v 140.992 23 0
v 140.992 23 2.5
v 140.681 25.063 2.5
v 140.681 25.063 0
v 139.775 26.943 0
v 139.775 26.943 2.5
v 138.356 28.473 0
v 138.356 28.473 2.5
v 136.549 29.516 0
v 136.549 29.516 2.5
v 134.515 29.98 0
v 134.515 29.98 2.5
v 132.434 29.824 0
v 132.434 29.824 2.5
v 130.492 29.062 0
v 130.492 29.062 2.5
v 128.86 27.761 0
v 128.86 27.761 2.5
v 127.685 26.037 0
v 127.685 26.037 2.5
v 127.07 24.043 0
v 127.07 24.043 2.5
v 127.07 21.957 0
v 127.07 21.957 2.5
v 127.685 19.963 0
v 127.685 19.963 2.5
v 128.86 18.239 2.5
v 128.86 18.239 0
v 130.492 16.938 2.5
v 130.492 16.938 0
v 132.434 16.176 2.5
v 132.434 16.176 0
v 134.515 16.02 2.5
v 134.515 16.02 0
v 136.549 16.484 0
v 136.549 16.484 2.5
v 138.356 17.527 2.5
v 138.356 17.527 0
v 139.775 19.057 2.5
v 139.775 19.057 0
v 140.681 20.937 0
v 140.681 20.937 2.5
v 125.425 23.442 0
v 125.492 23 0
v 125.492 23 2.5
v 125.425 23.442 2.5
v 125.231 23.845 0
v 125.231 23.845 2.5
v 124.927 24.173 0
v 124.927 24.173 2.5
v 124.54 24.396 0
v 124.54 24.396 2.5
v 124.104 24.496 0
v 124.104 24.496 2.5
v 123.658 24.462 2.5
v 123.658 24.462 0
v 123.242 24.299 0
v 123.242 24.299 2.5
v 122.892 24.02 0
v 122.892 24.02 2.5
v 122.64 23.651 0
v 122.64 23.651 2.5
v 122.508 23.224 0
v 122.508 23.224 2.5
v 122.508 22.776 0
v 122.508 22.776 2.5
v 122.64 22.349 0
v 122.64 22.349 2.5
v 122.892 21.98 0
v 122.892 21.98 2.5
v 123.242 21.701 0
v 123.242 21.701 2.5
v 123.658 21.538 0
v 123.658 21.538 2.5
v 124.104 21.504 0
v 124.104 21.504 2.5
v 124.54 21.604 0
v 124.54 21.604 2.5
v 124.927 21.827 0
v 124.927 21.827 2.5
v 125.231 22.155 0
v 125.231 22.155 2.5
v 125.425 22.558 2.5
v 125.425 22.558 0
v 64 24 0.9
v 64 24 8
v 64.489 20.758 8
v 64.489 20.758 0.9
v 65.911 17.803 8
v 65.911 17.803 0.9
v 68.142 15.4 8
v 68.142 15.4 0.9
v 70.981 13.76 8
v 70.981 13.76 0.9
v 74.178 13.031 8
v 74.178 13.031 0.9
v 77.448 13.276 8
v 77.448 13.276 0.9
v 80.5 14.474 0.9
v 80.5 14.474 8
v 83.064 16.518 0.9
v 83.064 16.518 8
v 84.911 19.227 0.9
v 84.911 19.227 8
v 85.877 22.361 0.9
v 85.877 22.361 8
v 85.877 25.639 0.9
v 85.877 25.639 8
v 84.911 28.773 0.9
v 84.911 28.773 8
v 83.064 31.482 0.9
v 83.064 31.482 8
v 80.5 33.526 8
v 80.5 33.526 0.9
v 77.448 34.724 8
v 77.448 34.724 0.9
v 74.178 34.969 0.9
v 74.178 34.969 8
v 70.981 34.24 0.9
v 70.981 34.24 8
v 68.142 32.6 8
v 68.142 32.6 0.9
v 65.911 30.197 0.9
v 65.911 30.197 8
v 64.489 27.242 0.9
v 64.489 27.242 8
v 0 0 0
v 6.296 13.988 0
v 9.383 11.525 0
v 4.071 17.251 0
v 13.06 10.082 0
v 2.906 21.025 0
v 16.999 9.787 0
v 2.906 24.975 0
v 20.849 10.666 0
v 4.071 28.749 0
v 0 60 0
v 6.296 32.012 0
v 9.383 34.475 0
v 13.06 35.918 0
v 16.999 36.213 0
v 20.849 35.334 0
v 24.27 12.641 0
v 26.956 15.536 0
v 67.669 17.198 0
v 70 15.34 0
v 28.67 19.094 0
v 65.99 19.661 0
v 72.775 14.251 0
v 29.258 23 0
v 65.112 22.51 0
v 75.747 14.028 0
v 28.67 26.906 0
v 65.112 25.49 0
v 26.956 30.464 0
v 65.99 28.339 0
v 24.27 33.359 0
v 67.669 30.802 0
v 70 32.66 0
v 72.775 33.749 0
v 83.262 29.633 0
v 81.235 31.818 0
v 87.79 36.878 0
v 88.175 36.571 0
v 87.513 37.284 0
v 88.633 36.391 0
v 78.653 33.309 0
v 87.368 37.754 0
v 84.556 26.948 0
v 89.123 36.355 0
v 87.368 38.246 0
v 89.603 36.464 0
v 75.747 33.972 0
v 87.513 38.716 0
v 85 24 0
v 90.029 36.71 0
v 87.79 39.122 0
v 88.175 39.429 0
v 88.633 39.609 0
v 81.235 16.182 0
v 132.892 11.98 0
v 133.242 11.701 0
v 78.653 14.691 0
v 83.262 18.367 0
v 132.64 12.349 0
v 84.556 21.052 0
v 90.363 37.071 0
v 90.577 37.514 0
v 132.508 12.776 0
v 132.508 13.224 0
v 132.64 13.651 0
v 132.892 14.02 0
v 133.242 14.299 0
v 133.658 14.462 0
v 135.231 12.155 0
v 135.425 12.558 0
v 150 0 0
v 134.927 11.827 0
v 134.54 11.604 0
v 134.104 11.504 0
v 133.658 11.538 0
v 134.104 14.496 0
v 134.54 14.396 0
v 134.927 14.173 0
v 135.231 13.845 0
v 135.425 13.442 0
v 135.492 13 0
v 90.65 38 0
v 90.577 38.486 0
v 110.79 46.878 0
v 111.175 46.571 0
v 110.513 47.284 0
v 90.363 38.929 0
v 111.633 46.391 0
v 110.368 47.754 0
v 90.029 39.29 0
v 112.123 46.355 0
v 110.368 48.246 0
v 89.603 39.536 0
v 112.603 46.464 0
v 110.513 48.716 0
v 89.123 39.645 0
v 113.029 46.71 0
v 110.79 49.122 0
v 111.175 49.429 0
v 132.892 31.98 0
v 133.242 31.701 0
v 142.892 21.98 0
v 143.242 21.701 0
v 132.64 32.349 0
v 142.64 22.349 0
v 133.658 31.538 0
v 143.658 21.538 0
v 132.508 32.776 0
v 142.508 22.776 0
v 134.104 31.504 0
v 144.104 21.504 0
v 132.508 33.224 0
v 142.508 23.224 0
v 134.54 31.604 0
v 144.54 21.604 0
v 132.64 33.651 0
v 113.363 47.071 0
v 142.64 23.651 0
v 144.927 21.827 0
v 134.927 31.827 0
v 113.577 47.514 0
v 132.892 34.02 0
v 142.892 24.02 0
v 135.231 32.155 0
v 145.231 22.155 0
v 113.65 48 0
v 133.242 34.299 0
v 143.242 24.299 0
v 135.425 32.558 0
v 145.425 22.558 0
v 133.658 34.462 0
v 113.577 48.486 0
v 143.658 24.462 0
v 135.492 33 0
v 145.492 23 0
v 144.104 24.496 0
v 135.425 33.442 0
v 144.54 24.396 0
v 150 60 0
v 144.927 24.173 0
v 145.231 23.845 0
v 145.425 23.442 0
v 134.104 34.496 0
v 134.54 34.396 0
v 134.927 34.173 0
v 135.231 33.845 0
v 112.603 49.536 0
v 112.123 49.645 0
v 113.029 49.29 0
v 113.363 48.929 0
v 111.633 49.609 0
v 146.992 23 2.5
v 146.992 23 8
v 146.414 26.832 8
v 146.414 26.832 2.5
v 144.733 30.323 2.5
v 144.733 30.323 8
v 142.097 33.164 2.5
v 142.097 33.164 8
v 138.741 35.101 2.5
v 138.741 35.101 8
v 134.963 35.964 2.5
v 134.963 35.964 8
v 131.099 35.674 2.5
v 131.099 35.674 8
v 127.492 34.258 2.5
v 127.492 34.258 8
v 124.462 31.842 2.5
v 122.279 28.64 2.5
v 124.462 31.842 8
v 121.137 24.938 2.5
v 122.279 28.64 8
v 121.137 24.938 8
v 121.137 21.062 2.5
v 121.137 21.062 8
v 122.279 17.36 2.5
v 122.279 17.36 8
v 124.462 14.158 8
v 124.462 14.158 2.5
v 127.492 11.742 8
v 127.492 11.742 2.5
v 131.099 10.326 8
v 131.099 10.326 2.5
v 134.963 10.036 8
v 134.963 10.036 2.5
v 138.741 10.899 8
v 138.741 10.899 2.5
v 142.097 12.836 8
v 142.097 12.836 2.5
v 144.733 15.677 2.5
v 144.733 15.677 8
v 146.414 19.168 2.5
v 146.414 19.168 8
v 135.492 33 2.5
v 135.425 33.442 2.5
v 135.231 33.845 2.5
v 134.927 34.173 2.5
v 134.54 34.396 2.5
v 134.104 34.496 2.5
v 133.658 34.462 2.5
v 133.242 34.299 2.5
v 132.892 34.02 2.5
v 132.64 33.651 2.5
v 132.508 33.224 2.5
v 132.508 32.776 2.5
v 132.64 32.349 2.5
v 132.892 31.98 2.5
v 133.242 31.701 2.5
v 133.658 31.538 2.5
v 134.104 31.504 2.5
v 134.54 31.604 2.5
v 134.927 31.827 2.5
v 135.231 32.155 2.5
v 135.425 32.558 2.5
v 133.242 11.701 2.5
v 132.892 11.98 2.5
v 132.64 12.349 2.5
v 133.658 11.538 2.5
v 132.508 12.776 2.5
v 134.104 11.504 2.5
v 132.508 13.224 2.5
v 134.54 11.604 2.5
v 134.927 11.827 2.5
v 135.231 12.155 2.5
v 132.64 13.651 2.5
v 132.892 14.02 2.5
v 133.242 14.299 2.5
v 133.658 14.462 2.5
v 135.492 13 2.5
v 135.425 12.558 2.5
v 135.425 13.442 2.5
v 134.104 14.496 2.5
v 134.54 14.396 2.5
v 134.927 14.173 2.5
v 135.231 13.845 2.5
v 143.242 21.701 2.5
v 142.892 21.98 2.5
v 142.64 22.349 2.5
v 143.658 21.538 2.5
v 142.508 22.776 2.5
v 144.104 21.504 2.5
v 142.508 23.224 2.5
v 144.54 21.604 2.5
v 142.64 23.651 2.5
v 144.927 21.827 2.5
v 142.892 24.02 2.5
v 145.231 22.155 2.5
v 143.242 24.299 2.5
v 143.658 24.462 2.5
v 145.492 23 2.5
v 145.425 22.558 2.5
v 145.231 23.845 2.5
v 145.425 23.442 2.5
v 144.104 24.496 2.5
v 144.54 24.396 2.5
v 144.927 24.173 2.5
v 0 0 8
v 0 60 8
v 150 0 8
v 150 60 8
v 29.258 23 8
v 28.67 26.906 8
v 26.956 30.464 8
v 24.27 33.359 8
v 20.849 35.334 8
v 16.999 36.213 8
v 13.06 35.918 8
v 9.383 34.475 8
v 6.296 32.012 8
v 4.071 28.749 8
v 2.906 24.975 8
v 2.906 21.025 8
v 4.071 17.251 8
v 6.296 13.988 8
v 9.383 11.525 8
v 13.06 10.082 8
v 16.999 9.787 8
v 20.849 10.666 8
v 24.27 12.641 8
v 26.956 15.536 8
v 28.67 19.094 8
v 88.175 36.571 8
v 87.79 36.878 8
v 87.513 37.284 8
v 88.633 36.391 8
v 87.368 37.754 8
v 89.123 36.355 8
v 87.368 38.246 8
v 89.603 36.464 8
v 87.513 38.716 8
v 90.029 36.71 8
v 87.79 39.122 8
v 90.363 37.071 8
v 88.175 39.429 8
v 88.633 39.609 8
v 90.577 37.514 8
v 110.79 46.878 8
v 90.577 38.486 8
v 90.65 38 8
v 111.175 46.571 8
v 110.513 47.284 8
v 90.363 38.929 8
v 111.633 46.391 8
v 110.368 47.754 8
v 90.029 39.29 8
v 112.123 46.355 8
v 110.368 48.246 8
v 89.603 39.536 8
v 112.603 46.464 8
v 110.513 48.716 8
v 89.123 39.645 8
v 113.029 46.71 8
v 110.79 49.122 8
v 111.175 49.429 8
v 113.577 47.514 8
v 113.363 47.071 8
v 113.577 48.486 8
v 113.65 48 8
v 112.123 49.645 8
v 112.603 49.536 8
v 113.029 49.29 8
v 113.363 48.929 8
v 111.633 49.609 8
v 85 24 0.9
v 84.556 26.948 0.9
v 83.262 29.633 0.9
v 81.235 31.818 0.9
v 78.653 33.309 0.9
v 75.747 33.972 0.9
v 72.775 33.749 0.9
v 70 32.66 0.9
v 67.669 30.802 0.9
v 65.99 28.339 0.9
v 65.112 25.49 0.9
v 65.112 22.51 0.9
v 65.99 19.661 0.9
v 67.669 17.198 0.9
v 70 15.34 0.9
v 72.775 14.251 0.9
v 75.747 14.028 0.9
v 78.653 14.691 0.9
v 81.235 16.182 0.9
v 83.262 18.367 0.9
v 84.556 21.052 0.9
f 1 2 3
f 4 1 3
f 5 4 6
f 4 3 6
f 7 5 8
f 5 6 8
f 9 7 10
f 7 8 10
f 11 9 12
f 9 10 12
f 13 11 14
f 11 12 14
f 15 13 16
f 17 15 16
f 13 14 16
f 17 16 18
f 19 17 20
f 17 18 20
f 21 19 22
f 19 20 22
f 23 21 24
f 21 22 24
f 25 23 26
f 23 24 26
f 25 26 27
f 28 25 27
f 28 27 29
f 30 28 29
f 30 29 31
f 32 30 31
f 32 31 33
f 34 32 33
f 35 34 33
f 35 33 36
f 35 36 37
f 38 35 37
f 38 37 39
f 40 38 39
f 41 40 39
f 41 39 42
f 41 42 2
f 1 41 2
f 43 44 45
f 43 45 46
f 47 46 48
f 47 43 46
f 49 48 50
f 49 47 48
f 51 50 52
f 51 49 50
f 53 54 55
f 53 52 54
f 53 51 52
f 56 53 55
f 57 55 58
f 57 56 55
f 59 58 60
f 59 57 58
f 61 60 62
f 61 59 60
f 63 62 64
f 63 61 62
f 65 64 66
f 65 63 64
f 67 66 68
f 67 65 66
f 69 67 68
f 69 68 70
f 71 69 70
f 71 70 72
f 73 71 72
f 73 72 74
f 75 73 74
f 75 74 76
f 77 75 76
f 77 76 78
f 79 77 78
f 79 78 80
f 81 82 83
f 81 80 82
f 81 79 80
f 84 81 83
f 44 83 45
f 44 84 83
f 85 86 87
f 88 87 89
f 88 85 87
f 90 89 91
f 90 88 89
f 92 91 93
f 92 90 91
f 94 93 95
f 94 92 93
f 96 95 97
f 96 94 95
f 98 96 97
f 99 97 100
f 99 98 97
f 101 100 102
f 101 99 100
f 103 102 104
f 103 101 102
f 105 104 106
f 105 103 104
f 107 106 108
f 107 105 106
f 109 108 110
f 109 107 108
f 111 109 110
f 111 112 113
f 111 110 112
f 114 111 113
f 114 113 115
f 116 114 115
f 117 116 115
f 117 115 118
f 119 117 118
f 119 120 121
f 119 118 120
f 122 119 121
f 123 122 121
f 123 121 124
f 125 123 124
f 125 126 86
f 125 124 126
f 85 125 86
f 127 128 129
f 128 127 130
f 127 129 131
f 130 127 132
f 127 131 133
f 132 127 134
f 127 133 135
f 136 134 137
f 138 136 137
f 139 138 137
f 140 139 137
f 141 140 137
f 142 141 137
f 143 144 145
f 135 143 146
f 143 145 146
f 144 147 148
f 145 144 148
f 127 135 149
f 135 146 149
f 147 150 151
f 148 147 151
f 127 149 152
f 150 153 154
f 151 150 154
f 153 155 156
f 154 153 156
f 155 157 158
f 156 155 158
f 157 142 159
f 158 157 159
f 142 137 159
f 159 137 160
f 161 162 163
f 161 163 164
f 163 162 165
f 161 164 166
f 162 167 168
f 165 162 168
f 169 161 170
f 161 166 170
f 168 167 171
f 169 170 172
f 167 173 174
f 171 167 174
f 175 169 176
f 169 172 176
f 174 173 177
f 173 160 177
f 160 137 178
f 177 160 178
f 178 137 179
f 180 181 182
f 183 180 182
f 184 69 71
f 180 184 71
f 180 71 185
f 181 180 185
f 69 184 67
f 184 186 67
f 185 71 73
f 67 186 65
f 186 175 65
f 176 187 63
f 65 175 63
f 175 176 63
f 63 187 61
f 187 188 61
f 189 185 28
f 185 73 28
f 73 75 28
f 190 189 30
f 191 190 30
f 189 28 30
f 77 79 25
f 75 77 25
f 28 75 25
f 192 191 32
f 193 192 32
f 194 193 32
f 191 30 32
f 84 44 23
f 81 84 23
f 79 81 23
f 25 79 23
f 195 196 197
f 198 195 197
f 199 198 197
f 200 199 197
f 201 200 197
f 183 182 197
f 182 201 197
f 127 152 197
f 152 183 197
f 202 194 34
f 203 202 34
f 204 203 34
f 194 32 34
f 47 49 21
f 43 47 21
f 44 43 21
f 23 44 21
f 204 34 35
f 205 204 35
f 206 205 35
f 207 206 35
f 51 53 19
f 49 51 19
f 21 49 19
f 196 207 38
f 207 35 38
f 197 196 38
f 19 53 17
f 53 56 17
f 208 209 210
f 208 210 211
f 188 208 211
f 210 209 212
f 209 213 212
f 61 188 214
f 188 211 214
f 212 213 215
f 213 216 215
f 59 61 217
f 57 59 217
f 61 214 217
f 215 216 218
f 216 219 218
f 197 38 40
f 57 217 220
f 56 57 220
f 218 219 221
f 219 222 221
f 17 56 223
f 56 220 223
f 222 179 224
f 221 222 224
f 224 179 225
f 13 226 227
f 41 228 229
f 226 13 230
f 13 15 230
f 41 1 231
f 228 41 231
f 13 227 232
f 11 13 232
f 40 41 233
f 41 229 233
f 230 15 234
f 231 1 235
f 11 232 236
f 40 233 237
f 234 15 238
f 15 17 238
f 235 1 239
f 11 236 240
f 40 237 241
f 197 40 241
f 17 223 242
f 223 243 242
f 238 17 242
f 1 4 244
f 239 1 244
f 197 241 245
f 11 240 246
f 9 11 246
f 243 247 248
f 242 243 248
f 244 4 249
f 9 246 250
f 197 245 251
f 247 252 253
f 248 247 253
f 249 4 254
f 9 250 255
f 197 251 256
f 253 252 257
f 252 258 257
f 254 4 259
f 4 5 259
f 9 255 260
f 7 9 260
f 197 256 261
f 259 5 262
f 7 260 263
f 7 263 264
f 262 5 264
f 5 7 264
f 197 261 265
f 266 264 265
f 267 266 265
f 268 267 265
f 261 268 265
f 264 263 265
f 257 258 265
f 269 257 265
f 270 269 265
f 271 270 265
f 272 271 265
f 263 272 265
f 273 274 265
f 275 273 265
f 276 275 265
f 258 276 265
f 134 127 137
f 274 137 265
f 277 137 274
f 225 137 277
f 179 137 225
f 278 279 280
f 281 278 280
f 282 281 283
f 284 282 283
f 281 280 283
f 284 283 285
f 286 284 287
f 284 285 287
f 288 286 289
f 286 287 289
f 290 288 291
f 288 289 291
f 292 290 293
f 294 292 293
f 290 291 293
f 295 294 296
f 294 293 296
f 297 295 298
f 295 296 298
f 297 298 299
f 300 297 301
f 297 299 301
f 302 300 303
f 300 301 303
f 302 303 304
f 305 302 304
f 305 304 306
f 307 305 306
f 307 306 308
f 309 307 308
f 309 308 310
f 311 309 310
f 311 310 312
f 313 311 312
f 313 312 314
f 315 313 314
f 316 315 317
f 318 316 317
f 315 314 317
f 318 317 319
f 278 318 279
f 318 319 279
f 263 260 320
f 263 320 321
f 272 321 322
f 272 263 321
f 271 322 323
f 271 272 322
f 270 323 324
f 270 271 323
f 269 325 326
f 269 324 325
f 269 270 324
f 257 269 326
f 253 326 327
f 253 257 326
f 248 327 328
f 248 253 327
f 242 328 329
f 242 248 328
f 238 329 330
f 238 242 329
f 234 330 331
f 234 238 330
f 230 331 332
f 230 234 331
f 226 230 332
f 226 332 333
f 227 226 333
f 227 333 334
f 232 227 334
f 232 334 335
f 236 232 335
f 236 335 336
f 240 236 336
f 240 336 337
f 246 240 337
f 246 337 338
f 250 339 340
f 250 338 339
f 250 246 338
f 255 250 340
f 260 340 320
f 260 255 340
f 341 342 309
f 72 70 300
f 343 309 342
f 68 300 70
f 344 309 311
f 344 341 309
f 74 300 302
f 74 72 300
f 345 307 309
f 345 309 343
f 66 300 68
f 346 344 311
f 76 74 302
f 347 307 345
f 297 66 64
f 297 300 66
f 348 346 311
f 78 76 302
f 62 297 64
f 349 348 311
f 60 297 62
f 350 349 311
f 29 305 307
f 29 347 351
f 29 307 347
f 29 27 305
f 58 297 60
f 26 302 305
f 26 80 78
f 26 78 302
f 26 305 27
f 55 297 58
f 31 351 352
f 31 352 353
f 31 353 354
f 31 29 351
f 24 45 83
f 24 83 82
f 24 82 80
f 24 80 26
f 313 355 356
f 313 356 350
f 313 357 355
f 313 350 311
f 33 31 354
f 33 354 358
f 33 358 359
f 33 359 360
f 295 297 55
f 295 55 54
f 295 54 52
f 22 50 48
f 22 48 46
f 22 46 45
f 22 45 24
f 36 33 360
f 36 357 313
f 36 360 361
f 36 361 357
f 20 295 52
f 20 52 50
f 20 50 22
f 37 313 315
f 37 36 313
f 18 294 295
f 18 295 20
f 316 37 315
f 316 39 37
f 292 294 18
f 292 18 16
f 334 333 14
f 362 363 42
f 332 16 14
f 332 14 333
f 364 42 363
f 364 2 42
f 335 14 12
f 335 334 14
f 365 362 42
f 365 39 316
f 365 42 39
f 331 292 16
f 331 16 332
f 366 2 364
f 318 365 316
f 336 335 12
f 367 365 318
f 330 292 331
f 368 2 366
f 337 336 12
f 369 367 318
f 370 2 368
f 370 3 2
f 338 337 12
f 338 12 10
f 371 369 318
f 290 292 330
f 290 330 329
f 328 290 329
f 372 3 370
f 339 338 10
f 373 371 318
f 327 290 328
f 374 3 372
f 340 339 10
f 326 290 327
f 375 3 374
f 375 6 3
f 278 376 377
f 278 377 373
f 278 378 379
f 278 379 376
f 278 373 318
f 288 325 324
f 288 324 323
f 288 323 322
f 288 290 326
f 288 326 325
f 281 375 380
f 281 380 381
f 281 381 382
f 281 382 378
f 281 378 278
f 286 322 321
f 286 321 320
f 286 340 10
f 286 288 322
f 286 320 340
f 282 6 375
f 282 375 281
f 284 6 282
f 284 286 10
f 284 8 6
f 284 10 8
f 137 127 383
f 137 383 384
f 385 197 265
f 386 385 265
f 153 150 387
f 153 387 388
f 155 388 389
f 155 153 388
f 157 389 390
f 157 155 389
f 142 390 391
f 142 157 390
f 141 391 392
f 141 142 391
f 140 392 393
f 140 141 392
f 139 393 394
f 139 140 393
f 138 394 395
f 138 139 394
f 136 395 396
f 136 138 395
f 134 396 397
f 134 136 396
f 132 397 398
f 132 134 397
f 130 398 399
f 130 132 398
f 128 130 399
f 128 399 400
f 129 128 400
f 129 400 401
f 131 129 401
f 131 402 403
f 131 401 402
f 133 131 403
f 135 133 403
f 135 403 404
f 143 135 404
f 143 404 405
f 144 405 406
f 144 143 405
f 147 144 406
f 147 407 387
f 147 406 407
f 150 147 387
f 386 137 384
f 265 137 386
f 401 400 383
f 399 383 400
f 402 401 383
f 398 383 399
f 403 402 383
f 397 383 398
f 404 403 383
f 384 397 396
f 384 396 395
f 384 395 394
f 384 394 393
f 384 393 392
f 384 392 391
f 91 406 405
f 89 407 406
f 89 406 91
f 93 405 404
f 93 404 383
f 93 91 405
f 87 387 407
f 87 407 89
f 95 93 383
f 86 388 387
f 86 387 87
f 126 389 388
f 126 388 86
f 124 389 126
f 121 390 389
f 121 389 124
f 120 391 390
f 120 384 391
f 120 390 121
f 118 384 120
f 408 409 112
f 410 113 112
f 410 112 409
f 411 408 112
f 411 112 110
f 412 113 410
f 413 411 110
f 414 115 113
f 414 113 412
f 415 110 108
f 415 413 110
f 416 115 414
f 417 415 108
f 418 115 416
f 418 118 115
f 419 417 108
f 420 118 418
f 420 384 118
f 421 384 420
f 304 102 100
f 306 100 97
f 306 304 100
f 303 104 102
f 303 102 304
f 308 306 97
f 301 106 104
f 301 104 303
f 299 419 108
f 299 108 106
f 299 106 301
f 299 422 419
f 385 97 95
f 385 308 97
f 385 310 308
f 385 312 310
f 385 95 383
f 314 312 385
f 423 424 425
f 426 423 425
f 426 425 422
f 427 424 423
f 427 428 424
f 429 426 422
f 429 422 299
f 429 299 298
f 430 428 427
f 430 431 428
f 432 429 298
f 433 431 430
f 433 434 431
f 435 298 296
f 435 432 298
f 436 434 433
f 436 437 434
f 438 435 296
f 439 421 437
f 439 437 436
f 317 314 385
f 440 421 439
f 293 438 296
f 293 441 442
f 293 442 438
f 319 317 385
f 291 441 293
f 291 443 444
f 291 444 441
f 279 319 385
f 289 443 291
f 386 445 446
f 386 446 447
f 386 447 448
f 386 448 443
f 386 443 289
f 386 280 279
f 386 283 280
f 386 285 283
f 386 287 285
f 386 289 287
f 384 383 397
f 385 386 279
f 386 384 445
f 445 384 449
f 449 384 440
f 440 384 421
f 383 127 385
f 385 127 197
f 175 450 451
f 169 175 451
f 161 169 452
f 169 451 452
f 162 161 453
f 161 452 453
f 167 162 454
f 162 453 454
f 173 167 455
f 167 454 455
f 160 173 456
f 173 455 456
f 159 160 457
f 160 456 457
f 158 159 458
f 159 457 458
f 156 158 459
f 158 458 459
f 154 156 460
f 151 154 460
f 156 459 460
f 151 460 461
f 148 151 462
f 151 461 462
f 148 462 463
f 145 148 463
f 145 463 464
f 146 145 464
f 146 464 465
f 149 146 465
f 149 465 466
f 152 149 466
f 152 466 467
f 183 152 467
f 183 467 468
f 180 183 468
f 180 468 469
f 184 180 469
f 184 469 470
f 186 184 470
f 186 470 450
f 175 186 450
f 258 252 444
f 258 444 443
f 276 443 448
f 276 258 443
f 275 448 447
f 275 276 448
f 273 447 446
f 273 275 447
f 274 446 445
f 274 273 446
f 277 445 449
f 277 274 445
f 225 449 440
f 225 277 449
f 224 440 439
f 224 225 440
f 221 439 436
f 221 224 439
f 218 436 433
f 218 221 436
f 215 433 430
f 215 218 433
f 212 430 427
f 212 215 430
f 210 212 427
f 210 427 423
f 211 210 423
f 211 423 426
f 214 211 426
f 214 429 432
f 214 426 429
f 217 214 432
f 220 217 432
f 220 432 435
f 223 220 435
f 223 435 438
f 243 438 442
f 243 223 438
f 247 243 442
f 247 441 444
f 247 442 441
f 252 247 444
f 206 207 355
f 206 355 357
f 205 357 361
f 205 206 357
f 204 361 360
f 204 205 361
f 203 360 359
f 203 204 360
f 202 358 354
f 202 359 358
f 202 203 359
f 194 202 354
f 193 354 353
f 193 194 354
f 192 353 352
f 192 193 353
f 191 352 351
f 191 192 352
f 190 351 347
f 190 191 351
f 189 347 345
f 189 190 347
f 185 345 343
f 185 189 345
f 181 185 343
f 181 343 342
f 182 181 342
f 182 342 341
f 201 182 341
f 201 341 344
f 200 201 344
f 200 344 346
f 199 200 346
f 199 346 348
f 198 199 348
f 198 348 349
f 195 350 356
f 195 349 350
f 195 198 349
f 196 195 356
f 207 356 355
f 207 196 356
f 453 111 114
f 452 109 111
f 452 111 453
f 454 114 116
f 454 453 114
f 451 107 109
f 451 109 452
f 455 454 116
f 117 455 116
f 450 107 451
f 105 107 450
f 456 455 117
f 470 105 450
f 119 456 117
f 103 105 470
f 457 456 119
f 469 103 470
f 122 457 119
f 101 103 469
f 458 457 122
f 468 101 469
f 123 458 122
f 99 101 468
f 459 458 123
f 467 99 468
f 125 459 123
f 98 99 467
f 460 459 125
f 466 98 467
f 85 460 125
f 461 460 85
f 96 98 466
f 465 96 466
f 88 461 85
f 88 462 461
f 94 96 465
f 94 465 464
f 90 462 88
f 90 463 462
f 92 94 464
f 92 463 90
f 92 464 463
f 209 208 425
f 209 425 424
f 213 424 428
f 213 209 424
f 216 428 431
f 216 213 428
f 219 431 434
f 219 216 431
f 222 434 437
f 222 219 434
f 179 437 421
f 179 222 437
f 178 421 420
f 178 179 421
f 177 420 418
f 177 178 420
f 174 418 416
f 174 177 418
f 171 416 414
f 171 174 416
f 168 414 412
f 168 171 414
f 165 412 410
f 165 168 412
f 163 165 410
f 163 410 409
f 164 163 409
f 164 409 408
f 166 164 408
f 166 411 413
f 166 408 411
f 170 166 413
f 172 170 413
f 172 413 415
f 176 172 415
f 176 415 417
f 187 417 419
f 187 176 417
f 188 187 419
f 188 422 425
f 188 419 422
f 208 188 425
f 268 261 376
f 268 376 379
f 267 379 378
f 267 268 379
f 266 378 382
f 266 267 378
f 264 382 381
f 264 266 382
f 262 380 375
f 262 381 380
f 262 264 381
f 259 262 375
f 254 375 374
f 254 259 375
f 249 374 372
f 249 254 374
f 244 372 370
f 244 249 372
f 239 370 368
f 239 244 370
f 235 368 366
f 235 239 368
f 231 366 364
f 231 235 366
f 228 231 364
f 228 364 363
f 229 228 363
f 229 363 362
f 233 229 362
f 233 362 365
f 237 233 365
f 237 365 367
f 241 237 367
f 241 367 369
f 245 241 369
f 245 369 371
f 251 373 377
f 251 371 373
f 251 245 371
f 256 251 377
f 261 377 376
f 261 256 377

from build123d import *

# Parameters (mm, degrees)
ESQUISSE1_W                  = 150
ESQUISSE1_H                  = 60
BOSS_EXTRU_1_DEPTH           = 8
ENL_V_MAT_EXTRU_1_DEPTH      = 162.752897965
ENL_V_MAT_EXTRU_1_DEPTH_BACK = 7.1
ESQUISSE2_R                  = 11
ESQUISSE3_R                  = 10
ENL_V_MAT_EXTRU_2_DEPTH      = 162.710883987
ESQUISSE4_R                  = 7
ENL_V_MAT_EXTRU_3_DEPTH      = 162.752897965
ESQUISSE5_R                  = 13
ENL_V_MAT_EXTRU_4_DEPTH      = 5.5
ENL_V_MAT_EXTRU_5_DEPTH      = 162.752897965
ENL_V_MAT_EXTRU_5_DEPTH_BACK = 162.752897965
ESQUISSE6_R                  = 13.25
ENL_V_MAT_EXTRU_6_DEPTH      = 162.752897965
ENL_V_MAT_EXTRU_6_DEPTH_BACK = 162.752897965
ESQUISSE7_R                  = 1.65
ENL_V_MAT_EXTRU_7_DEPTH      = 162.648538503
ENL_V_MAT_EXTRU_7_DEPTH_BACK = 162.648538503
ESQUISSE8_R                  = 1.5


with BuildPart() as part:
    # Esquisse1 → Boss.-Extru.1 (new body)
    with BuildSketch(Plane.XY):
        with Locations((75, 30)):
            Rectangle(ESQUISSE1_W, ESQUISSE1_H)
    extrude(amount=BOSS_EXTRU_1_DEPTH)

    # Esquisse2 → Enlèv. mat.-Extru.1 (cut, two sides: drawn at the far end of the back side and taken through both)
    with BuildSketch(Plane.XY.offset(8).offset(-ENL_V_MAT_EXTRU_1_DEPTH_BACK)):
        with Locations(Location((75, 24, 0), (0, 0, 180))):
            Circle(ESQUISSE2_R)
    extrude(amount=ENL_V_MAT_EXTRU_1_DEPTH + ENL_V_MAT_EXTRU_1_DEPTH_BACK, mode=Mode.SUBTRACT)

    # Esquisse3 → Enlèv. mat.-Extru.2 (cut, through all)
    with BuildSketch(Plane.XY.offset(0.9)):
        with Locations((75, 24)):
            Circle(ESQUISSE3_R)
    extrude(amount=-ENL_V_MAT_EXTRU_2_DEPTH, mode=Mode.SUBTRACT)

    # Esquisse4 → Enlèv. mat.-Extru.3 (cut, through all)
    with BuildSketch(Plane.XY.offset(8)):
        with Locations((133.991524815, 23)):
            Circle(ESQUISSE4_R)
    extrude(amount=-ENL_V_MAT_EXTRU_3_DEPTH, mode=Mode.SUBTRACT)

    # Esquisse5 → Enlèv. mat.-Extru.4 (cut)
    with BuildSketch(Plane.XY.offset(8)):
        with Locations((133.991524815, 23)):
            Circle(ESQUISSE5_R)
    extrude(amount=-ENL_V_MAT_EXTRU_4_DEPTH, mode=Mode.SUBTRACT)

    # Esquisse6 → Enlèv. mat.-Extru.5 (cut, two sides: drawn at the far end of the back side and taken through both)
    with BuildSketch(Plane.XY.offset(8).offset(-ENL_V_MAT_EXTRU_5_DEPTH_BACK)):
        with Locations((16.008475185, 23)):
            Circle(ESQUISSE6_R)
    extrude(amount=ENL_V_MAT_EXTRU_5_DEPTH + ENL_V_MAT_EXTRU_5_DEPTH_BACK, mode=Mode.SUBTRACT)

    # Esquisse7 → Enlèv. mat.-Extru.6 (cut, two sides: drawn at the far end of the back side and taken through both)
    with BuildSketch(Plane.XY.offset(8).offset(-ENL_V_MAT_EXTRU_6_DEPTH_BACK)):
        with Locations((89, 38)):
            Circle(ESQUISSE7_R)
        with Locations((112, 48)):
            Circle(ESQUISSE7_R)
    extrude(amount=ENL_V_MAT_EXTRU_6_DEPTH + ENL_V_MAT_EXTRU_6_DEPTH_BACK, mode=Mode.SUBTRACT)

    # Esquisse8 → Enlèv. mat.-Extru.7 (cut, two sides: drawn at the far end of the back side and taken through both)
    with BuildSketch(Plane.XY.offset(2.5).offset(-ENL_V_MAT_EXTRU_7_DEPTH_BACK)):
        with Locations((133.991524815, 13)):
            Circle(ESQUISSE8_R)
        with Locations((123.991524815, 23)):
            Circle(ESQUISSE8_R)
        with Locations((133.991524815, 33)):
            Circle(ESQUISSE8_R)
        with Locations((143.991524815, 23)):
            Circle(ESQUISSE8_R)
    extrude(amount=ENL_V_MAT_EXTRU_7_DEPTH + ENL_V_MAT_EXTRU_7_DEPTH_BACK, mode=Mode.SUBTRACT)


solid = part.part
